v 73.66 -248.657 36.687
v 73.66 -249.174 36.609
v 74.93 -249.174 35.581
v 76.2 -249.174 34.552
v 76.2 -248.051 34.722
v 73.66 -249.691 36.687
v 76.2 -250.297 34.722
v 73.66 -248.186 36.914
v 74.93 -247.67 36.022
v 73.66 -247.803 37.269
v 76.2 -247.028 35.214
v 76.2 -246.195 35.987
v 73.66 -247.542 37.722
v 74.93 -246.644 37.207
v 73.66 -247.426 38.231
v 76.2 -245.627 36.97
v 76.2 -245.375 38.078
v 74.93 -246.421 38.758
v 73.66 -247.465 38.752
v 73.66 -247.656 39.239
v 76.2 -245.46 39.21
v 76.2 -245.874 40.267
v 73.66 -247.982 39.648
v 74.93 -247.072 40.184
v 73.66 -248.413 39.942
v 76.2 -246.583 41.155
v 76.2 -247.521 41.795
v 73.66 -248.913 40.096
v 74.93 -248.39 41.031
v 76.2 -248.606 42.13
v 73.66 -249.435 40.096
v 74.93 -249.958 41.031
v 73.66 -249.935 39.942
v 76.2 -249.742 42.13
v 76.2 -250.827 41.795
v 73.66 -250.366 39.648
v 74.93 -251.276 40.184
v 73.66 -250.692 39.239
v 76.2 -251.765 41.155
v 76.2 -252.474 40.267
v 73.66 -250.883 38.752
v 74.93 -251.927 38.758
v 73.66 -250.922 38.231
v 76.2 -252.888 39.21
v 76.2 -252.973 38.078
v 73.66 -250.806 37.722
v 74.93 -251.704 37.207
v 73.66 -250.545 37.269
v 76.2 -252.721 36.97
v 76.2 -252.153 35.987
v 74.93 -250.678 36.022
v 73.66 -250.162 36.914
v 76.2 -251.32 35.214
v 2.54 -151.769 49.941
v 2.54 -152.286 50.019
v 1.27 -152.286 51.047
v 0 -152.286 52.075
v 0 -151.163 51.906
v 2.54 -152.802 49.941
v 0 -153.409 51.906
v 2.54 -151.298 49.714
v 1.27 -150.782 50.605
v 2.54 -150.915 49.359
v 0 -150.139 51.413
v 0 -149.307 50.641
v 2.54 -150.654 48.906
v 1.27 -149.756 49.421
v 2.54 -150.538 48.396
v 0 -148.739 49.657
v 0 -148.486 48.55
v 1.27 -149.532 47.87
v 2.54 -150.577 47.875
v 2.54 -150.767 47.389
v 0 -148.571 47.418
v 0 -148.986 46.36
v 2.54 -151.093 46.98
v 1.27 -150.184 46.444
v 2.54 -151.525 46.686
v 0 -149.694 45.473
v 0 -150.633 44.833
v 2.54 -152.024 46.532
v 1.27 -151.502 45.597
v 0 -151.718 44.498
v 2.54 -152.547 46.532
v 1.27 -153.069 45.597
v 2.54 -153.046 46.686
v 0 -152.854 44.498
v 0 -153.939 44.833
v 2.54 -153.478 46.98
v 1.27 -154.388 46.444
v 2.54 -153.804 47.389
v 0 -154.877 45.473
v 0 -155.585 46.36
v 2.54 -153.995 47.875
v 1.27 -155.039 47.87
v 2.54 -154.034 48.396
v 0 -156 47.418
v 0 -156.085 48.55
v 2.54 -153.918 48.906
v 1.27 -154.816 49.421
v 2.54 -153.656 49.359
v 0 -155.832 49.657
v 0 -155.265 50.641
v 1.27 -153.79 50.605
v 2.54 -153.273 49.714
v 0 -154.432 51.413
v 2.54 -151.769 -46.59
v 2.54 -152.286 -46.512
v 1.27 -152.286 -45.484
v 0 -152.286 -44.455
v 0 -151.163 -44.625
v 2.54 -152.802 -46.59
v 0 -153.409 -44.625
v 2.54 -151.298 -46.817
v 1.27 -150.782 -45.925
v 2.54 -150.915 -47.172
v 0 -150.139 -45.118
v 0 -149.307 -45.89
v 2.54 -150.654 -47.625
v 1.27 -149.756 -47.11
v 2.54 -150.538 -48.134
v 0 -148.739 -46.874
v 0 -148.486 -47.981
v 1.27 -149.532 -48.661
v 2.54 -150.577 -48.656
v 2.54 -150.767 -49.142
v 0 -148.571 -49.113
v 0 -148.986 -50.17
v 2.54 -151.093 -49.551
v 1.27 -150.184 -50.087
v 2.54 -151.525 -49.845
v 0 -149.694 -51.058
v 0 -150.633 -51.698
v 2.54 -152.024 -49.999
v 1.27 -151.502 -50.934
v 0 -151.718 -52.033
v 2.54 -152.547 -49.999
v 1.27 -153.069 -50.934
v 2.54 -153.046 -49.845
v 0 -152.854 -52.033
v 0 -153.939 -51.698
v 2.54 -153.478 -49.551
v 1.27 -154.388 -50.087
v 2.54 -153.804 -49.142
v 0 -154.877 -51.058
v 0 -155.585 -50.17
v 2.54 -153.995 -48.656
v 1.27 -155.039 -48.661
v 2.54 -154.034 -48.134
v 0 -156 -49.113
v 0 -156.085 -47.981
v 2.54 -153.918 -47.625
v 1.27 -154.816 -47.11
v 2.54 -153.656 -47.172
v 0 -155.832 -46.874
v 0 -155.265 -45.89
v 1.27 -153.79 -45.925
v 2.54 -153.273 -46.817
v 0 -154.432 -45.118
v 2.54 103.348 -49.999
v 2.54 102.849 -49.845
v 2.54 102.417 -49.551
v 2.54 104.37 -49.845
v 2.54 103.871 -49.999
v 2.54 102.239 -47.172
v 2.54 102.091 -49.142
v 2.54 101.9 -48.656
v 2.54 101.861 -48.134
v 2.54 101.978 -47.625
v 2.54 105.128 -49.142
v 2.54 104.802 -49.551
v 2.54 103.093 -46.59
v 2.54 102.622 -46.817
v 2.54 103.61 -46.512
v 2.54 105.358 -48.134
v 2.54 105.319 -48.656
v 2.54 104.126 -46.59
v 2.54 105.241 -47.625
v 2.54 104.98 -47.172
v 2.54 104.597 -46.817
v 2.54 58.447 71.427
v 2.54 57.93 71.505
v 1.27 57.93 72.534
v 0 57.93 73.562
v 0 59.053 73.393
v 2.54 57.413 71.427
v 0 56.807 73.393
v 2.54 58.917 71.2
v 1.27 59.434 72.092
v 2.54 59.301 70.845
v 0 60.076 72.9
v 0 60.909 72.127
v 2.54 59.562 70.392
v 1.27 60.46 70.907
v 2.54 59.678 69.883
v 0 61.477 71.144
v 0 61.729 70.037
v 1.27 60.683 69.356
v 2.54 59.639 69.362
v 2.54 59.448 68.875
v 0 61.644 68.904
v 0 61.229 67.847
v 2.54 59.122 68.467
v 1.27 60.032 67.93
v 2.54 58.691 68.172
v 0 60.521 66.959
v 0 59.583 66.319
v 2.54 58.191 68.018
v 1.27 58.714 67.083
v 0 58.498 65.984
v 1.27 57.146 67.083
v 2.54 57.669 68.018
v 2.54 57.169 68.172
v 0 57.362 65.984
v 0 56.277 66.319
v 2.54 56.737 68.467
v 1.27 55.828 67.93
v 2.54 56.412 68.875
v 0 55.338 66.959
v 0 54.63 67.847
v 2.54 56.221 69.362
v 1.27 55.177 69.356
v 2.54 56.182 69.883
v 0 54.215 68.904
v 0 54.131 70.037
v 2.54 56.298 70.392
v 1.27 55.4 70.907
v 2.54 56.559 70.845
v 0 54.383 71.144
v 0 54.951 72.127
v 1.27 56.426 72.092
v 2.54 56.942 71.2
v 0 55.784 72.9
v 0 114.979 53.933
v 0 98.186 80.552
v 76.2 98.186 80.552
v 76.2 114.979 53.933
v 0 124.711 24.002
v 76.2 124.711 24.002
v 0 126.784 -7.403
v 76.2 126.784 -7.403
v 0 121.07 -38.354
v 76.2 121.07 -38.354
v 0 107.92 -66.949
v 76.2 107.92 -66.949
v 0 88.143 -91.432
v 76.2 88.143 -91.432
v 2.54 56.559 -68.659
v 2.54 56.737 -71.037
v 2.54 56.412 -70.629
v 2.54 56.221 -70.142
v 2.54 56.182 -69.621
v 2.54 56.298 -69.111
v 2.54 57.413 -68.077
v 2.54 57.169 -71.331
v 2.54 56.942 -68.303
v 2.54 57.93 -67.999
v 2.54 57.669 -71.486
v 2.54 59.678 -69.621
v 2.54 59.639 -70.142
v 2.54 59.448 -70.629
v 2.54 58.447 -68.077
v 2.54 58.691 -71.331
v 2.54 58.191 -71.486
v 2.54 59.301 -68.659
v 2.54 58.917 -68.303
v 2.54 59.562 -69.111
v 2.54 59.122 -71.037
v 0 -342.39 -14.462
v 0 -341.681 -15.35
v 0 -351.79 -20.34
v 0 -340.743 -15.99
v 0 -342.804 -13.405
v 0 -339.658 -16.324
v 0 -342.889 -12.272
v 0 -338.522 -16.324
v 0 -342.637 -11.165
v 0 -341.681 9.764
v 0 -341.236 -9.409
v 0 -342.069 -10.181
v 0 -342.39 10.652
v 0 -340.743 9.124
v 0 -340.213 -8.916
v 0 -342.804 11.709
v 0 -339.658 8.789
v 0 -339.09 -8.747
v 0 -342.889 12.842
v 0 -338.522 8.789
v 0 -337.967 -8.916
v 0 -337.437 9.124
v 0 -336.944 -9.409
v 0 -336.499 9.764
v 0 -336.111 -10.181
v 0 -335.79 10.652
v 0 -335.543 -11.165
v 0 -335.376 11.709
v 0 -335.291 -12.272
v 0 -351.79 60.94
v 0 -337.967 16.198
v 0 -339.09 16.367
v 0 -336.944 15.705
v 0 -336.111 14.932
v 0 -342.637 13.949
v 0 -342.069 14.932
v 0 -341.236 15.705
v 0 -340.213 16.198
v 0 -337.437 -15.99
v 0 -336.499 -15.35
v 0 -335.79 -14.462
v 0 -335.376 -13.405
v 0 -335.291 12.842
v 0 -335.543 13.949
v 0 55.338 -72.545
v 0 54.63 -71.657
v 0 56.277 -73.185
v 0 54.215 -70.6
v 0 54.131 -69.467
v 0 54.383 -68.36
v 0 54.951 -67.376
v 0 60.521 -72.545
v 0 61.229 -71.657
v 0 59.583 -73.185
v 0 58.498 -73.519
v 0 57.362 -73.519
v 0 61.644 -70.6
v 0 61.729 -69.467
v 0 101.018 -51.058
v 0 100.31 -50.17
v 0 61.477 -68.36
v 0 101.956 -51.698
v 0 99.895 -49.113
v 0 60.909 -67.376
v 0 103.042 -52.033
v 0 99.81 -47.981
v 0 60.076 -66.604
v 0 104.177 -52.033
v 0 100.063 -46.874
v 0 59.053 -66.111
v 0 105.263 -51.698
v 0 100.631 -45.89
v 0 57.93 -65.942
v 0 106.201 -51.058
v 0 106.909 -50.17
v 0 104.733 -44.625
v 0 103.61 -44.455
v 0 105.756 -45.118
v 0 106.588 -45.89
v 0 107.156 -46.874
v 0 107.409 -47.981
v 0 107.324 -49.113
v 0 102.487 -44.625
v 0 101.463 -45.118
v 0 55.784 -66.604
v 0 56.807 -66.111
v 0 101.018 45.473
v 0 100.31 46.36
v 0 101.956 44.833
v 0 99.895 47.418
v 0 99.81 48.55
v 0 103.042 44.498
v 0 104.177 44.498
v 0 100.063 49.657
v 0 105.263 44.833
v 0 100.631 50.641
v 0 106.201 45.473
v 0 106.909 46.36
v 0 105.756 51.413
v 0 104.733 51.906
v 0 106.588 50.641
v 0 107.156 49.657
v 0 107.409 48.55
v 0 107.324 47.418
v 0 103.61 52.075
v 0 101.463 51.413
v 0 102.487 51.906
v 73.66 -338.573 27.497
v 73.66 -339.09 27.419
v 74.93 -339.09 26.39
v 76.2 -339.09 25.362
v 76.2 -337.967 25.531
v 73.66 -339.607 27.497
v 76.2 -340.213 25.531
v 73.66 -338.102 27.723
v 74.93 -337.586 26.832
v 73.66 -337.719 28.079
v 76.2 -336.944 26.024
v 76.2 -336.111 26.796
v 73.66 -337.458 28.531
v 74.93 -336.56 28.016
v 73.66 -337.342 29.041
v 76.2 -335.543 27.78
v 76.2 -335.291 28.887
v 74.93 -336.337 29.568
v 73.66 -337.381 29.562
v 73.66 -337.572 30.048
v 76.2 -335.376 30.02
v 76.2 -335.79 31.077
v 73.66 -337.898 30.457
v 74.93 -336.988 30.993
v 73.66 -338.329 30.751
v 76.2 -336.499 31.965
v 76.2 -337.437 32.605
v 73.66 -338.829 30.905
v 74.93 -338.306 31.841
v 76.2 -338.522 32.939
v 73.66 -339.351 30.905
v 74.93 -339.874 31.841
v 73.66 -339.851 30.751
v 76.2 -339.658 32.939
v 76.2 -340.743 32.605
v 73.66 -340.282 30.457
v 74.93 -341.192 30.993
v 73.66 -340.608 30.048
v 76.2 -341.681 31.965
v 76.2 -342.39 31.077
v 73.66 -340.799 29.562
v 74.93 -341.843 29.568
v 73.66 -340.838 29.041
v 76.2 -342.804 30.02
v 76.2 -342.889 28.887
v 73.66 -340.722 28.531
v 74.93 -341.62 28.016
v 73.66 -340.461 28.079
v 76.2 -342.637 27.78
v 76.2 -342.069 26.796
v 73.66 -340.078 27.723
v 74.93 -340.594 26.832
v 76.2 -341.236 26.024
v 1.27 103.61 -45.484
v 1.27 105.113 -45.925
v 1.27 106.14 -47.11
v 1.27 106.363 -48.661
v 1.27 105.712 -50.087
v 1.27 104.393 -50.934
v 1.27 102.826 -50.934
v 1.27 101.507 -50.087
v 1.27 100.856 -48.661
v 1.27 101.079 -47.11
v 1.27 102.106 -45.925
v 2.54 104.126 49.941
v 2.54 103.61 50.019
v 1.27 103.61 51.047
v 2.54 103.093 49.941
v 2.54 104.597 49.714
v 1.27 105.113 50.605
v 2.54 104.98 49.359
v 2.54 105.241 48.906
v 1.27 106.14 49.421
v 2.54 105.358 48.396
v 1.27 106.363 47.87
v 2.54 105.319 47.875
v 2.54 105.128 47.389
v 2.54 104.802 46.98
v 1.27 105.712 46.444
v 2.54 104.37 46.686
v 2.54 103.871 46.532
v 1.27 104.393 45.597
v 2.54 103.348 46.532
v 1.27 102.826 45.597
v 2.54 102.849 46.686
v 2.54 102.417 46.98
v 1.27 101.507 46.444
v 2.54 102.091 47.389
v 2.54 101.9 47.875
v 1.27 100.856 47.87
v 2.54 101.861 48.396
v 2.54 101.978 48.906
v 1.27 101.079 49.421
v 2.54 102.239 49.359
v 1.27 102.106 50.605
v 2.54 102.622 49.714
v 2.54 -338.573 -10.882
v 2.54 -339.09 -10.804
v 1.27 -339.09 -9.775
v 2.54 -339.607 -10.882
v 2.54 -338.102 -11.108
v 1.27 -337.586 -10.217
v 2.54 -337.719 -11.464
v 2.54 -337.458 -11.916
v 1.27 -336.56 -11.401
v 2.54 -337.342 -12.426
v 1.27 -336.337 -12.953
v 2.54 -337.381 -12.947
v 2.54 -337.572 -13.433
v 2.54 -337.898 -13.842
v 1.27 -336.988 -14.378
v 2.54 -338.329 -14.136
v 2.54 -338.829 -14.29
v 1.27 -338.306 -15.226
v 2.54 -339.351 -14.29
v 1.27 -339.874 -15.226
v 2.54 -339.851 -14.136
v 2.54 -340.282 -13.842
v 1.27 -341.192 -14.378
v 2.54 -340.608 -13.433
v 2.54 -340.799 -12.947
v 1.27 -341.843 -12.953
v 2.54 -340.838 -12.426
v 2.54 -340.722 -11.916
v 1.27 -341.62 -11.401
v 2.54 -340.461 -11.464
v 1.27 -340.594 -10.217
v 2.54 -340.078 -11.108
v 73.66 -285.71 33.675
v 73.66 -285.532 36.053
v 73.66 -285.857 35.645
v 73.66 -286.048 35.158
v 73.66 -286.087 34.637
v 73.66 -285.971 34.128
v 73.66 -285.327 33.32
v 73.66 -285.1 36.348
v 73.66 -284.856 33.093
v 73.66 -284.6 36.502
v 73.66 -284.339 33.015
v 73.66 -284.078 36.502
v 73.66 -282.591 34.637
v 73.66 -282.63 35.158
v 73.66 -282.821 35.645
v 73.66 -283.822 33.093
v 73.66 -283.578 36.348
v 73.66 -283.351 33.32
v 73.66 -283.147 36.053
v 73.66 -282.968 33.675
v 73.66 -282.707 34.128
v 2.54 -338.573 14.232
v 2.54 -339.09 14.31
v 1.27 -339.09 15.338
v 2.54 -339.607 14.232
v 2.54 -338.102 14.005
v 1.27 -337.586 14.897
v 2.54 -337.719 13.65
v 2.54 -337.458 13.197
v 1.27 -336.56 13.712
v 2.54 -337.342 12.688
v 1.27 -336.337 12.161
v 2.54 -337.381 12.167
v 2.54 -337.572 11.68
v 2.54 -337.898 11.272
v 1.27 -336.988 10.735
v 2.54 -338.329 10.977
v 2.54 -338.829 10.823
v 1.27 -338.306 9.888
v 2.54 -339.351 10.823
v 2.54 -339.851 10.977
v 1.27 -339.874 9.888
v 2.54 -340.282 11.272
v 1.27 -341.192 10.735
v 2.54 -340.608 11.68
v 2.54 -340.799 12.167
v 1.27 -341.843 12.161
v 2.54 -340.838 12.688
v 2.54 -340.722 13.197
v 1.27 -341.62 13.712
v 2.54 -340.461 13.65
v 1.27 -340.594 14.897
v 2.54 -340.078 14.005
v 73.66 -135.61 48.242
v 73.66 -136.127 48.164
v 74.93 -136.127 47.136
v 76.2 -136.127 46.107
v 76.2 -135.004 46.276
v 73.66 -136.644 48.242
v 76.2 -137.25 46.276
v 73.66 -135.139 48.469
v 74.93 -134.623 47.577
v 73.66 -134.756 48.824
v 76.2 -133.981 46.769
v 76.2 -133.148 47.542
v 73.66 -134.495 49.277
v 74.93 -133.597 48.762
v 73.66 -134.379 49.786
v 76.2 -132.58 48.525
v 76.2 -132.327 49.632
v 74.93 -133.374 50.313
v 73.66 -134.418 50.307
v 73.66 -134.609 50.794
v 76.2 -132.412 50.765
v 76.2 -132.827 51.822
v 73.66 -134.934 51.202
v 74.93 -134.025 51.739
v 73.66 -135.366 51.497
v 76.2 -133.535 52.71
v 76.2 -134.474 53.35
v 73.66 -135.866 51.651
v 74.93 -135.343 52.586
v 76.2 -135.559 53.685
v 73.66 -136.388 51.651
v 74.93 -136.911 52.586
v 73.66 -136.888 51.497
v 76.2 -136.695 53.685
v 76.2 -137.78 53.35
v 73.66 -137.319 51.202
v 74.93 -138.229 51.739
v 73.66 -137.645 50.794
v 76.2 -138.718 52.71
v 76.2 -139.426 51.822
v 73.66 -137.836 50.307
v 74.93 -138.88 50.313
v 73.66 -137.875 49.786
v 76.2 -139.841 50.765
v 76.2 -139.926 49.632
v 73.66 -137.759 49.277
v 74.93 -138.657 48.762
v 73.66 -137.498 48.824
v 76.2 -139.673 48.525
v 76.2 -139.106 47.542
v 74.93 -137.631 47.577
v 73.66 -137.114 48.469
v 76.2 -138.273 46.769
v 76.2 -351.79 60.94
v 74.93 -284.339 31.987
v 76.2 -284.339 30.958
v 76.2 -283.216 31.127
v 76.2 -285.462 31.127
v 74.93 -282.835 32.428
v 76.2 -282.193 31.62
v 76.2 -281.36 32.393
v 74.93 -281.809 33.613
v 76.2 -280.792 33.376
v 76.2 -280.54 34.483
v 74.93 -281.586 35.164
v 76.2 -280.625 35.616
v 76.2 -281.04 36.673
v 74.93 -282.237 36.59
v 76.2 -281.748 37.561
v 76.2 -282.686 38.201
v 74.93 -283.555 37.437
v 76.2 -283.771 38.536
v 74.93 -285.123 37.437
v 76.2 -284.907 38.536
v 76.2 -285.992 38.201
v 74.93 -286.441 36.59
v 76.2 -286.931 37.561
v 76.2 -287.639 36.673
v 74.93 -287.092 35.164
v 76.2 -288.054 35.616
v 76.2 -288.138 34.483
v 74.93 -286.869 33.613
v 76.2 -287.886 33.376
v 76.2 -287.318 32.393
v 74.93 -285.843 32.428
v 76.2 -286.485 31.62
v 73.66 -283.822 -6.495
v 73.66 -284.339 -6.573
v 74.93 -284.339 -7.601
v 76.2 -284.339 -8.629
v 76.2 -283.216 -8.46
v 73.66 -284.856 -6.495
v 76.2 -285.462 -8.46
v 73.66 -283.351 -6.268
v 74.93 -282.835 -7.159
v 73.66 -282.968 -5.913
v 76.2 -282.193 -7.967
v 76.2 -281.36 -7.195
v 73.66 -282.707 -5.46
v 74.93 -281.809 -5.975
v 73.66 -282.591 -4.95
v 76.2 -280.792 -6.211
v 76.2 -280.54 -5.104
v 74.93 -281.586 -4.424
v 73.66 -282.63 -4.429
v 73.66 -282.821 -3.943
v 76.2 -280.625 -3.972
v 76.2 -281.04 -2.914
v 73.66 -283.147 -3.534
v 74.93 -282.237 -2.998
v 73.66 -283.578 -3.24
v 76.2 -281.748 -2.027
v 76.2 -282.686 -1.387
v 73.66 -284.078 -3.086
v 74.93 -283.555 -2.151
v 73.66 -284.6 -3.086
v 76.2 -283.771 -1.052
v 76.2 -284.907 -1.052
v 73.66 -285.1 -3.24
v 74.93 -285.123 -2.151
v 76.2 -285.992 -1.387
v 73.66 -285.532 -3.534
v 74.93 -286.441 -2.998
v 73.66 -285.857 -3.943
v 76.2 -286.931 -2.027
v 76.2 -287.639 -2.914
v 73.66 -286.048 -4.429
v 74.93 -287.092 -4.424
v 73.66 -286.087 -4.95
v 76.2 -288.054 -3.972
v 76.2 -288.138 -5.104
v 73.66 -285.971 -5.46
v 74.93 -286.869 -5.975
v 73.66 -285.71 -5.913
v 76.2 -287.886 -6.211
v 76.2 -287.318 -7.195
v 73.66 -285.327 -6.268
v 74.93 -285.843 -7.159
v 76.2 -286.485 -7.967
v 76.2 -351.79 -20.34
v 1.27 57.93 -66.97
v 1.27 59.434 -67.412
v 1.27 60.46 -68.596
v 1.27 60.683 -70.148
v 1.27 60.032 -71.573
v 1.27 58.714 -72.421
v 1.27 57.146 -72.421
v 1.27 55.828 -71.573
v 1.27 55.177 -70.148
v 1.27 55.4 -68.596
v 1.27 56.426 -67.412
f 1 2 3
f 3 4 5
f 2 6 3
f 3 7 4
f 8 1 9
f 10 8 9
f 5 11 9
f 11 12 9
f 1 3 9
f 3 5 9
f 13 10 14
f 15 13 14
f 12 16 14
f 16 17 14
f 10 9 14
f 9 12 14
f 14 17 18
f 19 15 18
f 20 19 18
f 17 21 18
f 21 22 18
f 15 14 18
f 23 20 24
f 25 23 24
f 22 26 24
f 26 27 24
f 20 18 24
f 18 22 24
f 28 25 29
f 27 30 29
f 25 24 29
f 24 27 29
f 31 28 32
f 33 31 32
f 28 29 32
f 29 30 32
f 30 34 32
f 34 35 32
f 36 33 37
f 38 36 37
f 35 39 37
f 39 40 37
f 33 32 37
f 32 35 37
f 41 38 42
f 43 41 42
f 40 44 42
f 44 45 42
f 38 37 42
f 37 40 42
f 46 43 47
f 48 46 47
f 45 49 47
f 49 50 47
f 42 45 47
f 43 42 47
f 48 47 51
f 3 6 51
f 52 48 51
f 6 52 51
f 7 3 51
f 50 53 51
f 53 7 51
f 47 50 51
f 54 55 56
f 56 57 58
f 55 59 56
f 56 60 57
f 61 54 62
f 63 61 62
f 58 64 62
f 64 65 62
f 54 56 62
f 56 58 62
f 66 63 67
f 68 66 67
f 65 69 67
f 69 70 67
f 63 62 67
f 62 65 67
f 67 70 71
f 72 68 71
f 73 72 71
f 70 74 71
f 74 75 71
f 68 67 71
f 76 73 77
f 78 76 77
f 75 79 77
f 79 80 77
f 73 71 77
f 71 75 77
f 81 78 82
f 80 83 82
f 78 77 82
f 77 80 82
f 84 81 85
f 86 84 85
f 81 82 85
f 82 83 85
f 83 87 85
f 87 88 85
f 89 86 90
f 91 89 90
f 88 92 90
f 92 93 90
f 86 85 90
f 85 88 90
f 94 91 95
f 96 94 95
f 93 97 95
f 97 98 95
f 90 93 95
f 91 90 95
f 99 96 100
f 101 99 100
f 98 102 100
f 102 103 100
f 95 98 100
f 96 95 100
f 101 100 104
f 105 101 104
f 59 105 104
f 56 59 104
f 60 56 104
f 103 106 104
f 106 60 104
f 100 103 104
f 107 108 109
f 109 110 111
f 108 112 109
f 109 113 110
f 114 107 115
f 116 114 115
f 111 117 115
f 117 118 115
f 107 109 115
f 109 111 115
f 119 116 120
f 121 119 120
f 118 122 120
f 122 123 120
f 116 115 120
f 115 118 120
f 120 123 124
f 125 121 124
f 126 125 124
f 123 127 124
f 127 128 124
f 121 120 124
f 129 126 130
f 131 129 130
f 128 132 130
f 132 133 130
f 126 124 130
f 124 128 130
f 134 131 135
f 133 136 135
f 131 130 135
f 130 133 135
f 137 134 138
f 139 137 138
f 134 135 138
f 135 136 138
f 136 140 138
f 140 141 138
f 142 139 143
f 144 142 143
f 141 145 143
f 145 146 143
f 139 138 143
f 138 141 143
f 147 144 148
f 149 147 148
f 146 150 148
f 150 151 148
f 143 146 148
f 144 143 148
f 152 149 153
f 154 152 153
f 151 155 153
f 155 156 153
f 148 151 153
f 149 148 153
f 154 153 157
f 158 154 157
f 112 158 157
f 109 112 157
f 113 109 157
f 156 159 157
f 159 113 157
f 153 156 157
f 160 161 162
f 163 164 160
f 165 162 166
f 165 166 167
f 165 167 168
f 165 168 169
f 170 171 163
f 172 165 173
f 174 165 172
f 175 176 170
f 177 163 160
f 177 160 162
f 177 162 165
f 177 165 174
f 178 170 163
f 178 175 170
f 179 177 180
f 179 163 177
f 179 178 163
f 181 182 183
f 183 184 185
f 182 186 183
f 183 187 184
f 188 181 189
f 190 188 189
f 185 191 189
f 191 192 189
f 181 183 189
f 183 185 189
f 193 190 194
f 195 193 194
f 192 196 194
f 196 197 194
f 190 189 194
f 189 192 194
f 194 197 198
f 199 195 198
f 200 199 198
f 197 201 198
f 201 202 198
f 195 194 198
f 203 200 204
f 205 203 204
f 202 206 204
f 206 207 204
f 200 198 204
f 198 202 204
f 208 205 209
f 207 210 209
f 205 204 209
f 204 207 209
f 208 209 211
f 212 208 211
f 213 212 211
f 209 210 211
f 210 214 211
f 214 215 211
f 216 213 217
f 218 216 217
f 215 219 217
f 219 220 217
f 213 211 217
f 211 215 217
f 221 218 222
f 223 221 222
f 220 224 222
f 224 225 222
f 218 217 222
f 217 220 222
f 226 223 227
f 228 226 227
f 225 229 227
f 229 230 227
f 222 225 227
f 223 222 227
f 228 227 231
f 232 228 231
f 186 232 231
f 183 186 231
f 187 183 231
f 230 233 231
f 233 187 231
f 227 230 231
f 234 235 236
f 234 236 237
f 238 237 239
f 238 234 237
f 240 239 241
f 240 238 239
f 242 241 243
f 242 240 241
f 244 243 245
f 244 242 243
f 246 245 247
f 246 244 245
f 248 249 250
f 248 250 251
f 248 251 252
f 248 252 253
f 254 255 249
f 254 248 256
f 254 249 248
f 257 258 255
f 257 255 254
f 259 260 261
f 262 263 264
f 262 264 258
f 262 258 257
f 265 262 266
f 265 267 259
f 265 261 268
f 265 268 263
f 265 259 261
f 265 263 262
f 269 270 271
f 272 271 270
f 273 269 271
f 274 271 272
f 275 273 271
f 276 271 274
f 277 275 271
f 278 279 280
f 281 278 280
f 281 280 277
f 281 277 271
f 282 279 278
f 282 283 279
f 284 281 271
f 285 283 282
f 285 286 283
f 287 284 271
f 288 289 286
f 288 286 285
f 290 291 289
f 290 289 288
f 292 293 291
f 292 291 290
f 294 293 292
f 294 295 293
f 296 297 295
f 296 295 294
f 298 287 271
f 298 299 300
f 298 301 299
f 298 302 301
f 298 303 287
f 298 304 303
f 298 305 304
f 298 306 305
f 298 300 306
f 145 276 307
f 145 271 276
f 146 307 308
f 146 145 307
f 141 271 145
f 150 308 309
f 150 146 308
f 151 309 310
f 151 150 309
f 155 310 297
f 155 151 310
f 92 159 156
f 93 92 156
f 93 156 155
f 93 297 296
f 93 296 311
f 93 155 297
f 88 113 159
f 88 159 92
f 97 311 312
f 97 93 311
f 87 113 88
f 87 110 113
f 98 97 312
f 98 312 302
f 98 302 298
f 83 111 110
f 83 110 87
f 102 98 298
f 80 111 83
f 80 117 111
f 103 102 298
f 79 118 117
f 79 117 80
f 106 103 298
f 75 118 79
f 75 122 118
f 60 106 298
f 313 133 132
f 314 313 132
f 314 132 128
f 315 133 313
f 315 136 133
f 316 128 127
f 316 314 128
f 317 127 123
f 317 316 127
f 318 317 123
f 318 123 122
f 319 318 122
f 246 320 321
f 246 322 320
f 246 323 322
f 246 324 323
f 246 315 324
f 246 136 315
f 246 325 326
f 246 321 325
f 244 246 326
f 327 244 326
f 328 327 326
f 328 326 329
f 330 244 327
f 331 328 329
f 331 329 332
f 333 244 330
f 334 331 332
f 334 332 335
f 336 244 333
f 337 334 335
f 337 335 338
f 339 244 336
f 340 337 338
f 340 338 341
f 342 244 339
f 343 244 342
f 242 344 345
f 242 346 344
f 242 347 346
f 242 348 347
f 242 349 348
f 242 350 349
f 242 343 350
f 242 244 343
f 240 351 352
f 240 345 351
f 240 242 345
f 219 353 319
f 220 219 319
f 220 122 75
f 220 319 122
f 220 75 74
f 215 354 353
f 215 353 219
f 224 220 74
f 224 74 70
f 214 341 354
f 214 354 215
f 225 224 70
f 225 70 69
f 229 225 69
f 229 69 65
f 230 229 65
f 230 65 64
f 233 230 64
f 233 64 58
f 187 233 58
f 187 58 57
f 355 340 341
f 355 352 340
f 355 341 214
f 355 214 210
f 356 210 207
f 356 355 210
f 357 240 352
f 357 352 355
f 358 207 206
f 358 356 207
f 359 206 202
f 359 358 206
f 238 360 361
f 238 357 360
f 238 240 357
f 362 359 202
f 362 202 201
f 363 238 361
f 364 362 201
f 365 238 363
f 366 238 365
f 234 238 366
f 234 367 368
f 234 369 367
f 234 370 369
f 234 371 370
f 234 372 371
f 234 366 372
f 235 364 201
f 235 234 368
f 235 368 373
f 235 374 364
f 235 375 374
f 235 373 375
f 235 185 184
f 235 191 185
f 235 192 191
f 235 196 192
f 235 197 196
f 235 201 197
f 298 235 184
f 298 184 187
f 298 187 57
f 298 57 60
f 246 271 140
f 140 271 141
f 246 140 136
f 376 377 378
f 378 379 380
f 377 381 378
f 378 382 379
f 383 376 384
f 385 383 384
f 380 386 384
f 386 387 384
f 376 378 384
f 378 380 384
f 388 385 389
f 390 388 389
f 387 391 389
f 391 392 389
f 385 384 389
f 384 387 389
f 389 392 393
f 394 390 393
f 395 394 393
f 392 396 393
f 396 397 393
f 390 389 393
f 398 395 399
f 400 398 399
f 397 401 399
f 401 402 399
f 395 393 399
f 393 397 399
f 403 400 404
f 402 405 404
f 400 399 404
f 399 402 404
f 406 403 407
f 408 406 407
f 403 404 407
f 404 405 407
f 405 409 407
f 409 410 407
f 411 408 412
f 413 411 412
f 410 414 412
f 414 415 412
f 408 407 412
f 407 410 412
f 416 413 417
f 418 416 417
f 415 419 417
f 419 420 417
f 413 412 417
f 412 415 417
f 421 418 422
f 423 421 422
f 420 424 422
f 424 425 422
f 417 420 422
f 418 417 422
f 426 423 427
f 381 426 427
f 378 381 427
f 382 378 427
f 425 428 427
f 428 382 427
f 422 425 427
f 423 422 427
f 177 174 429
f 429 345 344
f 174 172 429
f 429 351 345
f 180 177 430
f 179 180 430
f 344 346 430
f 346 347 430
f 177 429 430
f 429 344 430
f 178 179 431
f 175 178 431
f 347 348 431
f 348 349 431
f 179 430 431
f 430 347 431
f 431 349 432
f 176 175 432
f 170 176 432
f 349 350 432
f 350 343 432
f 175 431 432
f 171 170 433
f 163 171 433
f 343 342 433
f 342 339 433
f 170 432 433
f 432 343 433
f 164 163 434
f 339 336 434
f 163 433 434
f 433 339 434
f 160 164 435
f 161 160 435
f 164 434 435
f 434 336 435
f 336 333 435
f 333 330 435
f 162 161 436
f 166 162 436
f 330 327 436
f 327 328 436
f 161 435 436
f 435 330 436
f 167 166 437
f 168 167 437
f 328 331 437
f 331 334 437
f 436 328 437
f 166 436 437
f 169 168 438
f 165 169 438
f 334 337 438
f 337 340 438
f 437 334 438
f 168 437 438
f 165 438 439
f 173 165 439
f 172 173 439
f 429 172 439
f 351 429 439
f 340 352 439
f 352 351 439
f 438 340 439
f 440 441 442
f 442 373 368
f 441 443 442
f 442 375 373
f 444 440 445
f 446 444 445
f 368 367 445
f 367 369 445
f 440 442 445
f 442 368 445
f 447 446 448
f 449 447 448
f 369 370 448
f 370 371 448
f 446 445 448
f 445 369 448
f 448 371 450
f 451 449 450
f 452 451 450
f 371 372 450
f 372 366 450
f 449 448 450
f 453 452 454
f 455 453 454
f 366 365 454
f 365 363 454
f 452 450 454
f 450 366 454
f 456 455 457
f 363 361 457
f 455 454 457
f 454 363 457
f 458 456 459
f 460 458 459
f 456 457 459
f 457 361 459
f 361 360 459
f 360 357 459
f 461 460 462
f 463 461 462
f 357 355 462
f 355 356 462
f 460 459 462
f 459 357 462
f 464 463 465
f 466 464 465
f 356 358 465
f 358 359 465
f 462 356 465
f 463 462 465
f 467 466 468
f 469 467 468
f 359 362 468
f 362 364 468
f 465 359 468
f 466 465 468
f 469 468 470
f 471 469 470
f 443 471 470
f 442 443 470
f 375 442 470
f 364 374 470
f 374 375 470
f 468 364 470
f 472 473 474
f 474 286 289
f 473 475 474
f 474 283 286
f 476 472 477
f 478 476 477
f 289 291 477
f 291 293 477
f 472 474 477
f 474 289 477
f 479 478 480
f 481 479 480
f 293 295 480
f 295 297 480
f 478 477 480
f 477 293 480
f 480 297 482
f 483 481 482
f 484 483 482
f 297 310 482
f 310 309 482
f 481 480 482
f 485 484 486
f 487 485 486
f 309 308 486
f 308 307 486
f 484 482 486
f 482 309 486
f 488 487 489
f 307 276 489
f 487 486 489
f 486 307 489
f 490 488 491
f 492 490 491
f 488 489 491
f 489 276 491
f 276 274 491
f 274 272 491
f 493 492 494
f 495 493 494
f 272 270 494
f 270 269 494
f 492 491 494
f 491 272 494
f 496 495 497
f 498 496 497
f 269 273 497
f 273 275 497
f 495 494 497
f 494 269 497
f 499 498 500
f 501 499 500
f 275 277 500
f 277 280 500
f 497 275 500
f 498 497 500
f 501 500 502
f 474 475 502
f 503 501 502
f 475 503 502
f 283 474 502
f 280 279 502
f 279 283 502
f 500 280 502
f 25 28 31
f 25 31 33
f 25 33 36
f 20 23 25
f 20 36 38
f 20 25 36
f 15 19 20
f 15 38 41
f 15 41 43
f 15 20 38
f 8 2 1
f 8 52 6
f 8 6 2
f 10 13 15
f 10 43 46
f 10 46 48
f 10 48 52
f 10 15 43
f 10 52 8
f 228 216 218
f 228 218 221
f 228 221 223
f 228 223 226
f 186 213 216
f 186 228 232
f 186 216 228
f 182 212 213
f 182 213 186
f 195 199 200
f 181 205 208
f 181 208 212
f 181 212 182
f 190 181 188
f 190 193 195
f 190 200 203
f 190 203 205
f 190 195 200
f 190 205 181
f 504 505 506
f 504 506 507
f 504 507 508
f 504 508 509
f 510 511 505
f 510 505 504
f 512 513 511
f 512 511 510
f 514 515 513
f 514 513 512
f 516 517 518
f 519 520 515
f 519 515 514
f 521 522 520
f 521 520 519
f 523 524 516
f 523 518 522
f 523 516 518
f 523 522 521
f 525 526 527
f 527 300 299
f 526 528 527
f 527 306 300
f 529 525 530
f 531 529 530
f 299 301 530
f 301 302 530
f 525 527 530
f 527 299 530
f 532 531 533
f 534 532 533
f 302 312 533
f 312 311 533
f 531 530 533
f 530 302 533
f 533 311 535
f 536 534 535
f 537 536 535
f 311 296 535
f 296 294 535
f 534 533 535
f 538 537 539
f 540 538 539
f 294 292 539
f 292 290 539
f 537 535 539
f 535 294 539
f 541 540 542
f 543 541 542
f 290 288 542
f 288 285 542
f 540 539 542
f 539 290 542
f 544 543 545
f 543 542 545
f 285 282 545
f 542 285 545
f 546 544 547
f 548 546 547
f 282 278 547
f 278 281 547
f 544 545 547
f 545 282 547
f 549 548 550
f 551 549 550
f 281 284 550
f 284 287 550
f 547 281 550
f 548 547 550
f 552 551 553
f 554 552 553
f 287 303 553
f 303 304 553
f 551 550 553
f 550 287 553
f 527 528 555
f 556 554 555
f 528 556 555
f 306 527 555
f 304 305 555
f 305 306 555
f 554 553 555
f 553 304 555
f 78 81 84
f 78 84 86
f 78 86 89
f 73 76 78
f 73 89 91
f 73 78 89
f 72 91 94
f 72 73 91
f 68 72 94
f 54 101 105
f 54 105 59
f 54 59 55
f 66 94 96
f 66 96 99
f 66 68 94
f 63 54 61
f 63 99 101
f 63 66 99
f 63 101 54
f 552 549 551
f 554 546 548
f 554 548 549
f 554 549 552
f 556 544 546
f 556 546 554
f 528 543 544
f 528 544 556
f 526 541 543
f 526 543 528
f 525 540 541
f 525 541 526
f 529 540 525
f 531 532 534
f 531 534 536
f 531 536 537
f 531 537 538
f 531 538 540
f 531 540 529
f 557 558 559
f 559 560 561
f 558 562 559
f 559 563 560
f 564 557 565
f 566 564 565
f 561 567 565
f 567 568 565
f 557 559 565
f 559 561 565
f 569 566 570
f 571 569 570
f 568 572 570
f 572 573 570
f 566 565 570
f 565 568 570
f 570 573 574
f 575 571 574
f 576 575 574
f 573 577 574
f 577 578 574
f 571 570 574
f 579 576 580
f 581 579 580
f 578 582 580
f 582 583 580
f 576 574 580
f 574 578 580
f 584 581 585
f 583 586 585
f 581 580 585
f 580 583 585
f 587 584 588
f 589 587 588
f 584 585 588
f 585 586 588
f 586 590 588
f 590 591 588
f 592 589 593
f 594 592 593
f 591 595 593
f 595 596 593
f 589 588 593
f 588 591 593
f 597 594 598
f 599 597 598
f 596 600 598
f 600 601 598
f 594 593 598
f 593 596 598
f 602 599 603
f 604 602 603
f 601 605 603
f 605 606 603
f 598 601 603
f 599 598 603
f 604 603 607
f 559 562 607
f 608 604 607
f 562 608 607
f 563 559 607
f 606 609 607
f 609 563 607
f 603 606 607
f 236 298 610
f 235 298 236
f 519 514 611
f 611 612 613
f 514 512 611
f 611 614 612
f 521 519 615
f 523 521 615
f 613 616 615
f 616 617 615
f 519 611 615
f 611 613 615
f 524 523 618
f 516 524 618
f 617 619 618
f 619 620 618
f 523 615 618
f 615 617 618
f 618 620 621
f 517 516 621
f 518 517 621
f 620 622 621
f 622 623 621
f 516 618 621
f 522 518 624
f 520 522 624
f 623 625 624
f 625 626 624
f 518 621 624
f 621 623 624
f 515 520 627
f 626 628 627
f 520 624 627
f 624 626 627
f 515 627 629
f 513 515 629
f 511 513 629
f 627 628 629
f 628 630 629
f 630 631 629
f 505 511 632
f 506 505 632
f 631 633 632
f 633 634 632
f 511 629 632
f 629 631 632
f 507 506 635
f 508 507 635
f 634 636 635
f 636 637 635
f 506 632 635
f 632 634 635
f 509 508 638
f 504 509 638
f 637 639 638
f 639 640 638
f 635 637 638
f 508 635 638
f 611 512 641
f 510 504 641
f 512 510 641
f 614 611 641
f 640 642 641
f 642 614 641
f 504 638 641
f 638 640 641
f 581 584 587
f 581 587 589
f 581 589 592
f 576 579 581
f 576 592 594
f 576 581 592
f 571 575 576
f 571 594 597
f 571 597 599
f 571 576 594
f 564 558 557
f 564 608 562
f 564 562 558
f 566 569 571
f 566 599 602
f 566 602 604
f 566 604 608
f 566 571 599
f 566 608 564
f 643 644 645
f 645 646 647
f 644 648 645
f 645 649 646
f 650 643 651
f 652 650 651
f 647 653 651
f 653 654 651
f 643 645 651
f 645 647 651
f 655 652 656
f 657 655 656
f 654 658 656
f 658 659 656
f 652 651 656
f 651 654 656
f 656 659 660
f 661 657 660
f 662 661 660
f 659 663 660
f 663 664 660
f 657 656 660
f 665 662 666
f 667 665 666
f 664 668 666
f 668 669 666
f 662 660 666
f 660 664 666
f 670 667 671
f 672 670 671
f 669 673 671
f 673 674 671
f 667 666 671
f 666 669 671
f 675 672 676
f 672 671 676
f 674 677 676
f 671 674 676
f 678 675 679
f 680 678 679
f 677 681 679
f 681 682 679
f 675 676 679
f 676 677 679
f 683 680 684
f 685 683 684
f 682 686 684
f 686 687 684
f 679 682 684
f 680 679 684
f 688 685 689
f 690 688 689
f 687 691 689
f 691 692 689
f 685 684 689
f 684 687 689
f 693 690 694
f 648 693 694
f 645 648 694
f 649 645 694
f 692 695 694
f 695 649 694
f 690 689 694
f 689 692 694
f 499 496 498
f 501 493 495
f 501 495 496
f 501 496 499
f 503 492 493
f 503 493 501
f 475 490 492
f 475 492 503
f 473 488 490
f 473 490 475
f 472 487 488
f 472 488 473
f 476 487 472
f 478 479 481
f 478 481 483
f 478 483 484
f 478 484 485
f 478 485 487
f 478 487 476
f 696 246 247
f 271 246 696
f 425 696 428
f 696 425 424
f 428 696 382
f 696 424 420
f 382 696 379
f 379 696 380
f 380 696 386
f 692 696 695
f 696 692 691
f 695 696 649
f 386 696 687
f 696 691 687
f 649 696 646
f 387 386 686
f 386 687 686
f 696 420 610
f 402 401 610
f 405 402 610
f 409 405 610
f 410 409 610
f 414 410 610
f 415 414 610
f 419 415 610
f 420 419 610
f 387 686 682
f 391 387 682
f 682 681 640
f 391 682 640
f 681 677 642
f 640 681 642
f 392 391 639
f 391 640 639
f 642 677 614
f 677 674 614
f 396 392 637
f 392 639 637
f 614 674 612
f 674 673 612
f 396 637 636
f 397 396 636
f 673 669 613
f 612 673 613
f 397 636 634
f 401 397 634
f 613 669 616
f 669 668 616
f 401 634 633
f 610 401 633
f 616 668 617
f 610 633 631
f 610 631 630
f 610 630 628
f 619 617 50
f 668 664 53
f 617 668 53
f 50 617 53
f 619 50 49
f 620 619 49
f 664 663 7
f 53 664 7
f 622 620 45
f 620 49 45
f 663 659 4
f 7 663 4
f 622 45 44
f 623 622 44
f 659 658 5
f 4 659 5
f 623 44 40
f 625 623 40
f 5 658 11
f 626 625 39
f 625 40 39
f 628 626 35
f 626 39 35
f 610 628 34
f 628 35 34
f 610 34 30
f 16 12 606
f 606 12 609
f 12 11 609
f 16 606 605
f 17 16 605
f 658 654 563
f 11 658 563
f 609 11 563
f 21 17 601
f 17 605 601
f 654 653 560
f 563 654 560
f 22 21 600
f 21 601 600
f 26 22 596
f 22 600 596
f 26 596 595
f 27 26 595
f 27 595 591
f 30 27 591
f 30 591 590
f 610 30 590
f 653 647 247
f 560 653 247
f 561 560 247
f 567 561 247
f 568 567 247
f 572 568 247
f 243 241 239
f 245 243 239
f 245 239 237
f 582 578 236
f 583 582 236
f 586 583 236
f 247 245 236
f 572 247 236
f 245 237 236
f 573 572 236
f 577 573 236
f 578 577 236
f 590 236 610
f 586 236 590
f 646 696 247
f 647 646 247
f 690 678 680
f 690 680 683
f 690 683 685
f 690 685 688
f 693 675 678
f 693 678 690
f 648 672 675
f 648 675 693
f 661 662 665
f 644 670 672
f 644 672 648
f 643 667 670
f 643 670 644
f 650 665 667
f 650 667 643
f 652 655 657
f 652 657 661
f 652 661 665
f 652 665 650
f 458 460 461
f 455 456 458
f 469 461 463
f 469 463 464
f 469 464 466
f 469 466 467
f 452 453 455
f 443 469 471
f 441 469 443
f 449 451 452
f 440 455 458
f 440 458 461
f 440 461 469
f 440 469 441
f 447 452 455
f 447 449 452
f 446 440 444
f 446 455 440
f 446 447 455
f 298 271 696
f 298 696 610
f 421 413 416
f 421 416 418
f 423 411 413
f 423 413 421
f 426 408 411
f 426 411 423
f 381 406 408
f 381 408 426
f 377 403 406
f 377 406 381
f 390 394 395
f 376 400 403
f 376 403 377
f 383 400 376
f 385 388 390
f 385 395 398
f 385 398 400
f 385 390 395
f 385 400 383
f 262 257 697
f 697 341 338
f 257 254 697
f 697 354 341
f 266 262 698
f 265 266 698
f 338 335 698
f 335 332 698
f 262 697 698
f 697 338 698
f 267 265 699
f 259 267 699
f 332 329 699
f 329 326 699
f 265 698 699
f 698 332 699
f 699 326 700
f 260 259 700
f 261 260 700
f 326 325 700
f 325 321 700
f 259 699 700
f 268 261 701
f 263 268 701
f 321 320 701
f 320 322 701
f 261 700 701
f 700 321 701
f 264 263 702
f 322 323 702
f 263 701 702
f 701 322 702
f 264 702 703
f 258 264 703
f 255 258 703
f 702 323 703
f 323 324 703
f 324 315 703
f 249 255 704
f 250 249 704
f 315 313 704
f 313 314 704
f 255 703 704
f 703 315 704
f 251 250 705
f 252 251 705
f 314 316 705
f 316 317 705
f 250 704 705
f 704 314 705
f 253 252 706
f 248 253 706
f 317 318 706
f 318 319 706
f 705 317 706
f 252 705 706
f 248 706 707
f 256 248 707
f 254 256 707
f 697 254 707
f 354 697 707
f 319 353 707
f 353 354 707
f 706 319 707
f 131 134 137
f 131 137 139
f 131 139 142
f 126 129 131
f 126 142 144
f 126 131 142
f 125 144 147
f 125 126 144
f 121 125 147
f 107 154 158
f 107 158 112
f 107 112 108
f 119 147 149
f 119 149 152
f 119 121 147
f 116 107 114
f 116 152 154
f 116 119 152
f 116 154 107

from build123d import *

# Parameters (mm, degrees)
SALIENTE_EXTRUIR1_DEPTH         = 76.2
CROQUIS4_R                      = 3.81
CORTAR_EXTRUIR1_DEPTH           = 2.54
CORTAR_EXTRUIR1_DRAFT           = -39
CORTAR_EXTRUIR1_PROFILE_2_DEPTH = 2.54
CORTAR_EXTRUIR1_PROFILE_2_DRAFT = -39
CORTAR_EXTRUIR1_PROFILE_3_DEPTH = 2.54
CORTAR_EXTRUIR1_PROFILE_3_DRAFT = -39
CORTAR_EXTRUIR1_PROFILE_4_DEPTH = 2.54
CORTAR_EXTRUIR1_PROFILE_4_DRAFT = -39
CORTAR_EXTRUIR1_PROFILE_5_DEPTH = 2.54
CORTAR_EXTRUIR1_PROFILE_5_DRAFT = -39
CORTAR_EXTRUIR1_PROFILE_6_DEPTH = 2.54
CORTAR_EXTRUIR1_PROFILE_6_DRAFT = -39
CROQUIS5_R                      = 3.81
CORTAR_EXTRUIR2_DEPTH           = 2.54
CORTAR_EXTRUIR2_DRAFT           = -39
CORTAR_EXTRUIR2_PROFILE_2_DEPTH = 2.54
CORTAR_EXTRUIR2_PROFILE_2_DRAFT = -39
CORTAR_EXTRUIR2_PROFILE_3_DEPTH = 2.54
CORTAR_EXTRUIR2_PROFILE_3_DRAFT = -39
CORTAR_EXTRUIR2_PROFILE_4_DEPTH = 2.54
CORTAR_EXTRUIR2_PROFILE_4_DRAFT = -39
CORTAR_EXTRUIR2_PROFILE_5_DEPTH = 2.54
CORTAR_EXTRUIR2_PROFILE_5_DRAFT = -39
CORTAR_EXTRUIR2_PROFILE_6_DEPTH = 2.54
CORTAR_EXTRUIR2_PROFILE_6_DRAFT = -39
CORTAR_EXTRUIR2_PROFILE_7_DEPTH = 2.54
CORTAR_EXTRUIR2_PROFILE_7_DRAFT = -39
CORTAR_EXTRUIR2_PROFILE_8_DEPTH = 2.54
CORTAR_EXTRUIR2_PROFILE_8_DRAFT = -39
CORTAR_EXTRUIR2_PROFILE_9_DEPTH = 2.54
CORTAR_EXTRUIR2_PROFILE_9_DRAFT = -39


with BuildPart() as part:
    # Croquis1 → Saliente-Extruir1 (new body)
    with BuildSketch(Plane(origin=(0, 0, 0), x_dir=(0, 0, -1), z_dir=(1, 0, 0))):
        with BuildLine():
            Line((-60.94000004, -351.79000001), (-80.551642675, 98.185705998))
            ThreePointArc((-80.551642675, 98.185705998), (7.403499257, 126.784021859), (91.432215779, 88.142781427))
            Line((91.432215779, 88.142781427), (20.33999996, -351.79000001))
            Line((20.33999996, -351.79000001), (-60.94000004, -351.79000001))
        make_face()
    extrude(amount=SALIENTE_EXTRUIR1_DEPTH)


with BuildPart() as cortar_extruir1_tool:
    # Croquis4 → Cortar-Extruir1 (with draft: the straight prism first)
    with BuildSketch(Plane(origin=(76.2, 0, 0), x_dir=(0, 0, -1), z_dir=(1, 0, 0))):
        with Locations((-49.917099877, -136.126844727)):
            Circle(CROQUIS4_R)
    extrude(amount=-CORTAR_EXTRUIR1_DEPTH)
    # Cortar-Extruir1: the draft: its side faces are tilted about the plane it starts from
    cortar_extruir1_sides = [cortar_extruir1_tool.faces().sort_by_distance(p)[0] for p in [
        (74.93, -136.126844727, 53.727099877),
    ]]
    draft(cortar_extruir1_sides, Plane(origin=(76.2, 0, 0), x_dir=(0, 0, -1), z_dir=(1, 0, 0)), CORTAR_EXTRUIR1_DRAFT)


with BuildPart() as part_1:
    add(part.part)

    # Cortar-Extruir1: cut by cortar_extruir1_tool
    add(cortar_extruir1_tool.part, mode=Mode.SUBTRACT)


with BuildPart() as cortar_extruir1_profile_2_tool:
    # Croquis4 → Cortar-Extruir1 profile 2 (with draft: the straight prism first)
    with BuildSketch(Plane(origin=(76.2, 0, 0), x_dir=(0, 0, -1), z_dir=(1, 0, 0))):
        with Locations((-38.362373799, -249.174001321)):
            Circle(CROQUIS4_R)
    extrude(amount=-CORTAR_EXTRUIR1_PROFILE_2_DEPTH)
    # Cortar-Extruir1 profile 2: the draft: its side faces are tilted about the plane it starts from
    cortar_extruir1_profile_2_sides = [cortar_extruir1_profile_2_tool.faces().sort_by_distance(p)[0] for p in [
        (74.93, -249.174001321, 42.172373799),
    ]]
    draft(cortar_extruir1_profile_2_sides, Plane(origin=(76.2, 0, 0), x_dir=(0, 0, -1), z_dir=(1, 0, 0)), CORTAR_EXTRUIR1_PROFILE_2_DRAFT)


with BuildPart() as part_2:
    add(part_1.part)

    # Cortar-Extruir1 profile 2: cut by cortar_extruir1_profile_2_tool
    add(cortar_extruir1_profile_2_tool.part, mode=Mode.SUBTRACT)


with BuildPart() as cortar_extruir1_profile_3_tool:
    # Croquis4 → Cortar-Extruir1 profile 3 (with draft: the straight prism first)
    with BuildSketch(Plane(origin=(76.2, 0, 0), x_dir=(0, 0, -1), z_dir=(1, 0, 0))):
        with Locations((-34.768096531, -284.339077712)):
            Circle(CROQUIS4_R)
    extrude(amount=-CORTAR_EXTRUIR1_PROFILE_3_DEPTH)
    # Cortar-Extruir1 profile 3: the draft: its side faces are tilted about the plane it starts from
    cortar_extruir1_profile_3_sides = [cortar_extruir1_profile_3_tool.faces().sort_by_distance(p)[0] for p in [
        (74.93, -284.339077712, 38.578096531),
    ]]
    draft(cortar_extruir1_profile_3_sides, Plane(origin=(76.2, 0, 0), x_dir=(0, 0, -1), z_dir=(1, 0, 0)), CORTAR_EXTRUIR1_PROFILE_3_DRAFT)


with BuildPart() as part_3:
    add(part_2.part)

    # Cortar-Extruir1 profile 3: cut by cortar_extruir1_profile_3_tool
    add(cortar_extruir1_profile_3_tool.part, mode=Mode.SUBTRACT)


with BuildPart() as cortar_extruir1_profile_4_tool:
    # Croquis4 → Cortar-Extruir1 profile 4 (with draft: the straight prism first)
    with BuildSketch(Plane(origin=(76.2, 0, 0), x_dir=(0, 0, -1), z_dir=(1, 0, 0))):
        with Locations((-29.171919425, -339.09000001)):
            Circle(CROQUIS4_R)
    extrude(amount=-CORTAR_EXTRUIR1_PROFILE_4_DEPTH)
    # Cortar-Extruir1 profile 4: the draft: its side faces are tilted about the plane it starts from
    cortar_extruir1_profile_4_sides = [cortar_extruir1_profile_4_tool.faces().sort_by_distance(p)[0] for p in [
        (74.93, -339.09000001, 32.981919425),
    ]]
    draft(cortar_extruir1_profile_4_sides, Plane(origin=(76.2, 0, 0), x_dir=(0, 0, -1), z_dir=(1, 0, 0)), CORTAR_EXTRUIR1_PROFILE_4_DRAFT)


with BuildPart() as part_4:
    add(part_3.part)

    # Cortar-Extruir1 profile 4: cut by cortar_extruir1_profile_4_tool
    add(cortar_extruir1_profile_4_tool.part, mode=Mode.SUBTRACT)


with BuildPart() as cortar_extruir1_profile_5_tool:
    # Croquis4 → Cortar-Extruir1 profile 5 (with draft: the straight prism first)
    with BuildSketch(Plane(origin=(76.2, 0, 0), x_dir=(0, 0, -1), z_dir=(1, 0, 0))):
        with Locations((29.171919425, -339.09000001)):
            Circle(CROQUIS4_R)
    extrude(amount=-CORTAR_EXTRUIR1_PROFILE_5_DEPTH)
    # Cortar-Extruir1 profile 5: the draft: its side faces are tilted about the plane it starts from
    cortar_extruir1_profile_5_sides = [cortar_extruir1_profile_5_tool.faces().sort_by_distance(p)[0] for p in [
        (74.93, -339.09000001, -25.361919425),
    ]]
    draft(cortar_extruir1_profile_5_sides, Plane(origin=(76.2, 0, 0), x_dir=(0, 0, -1), z_dir=(1, 0, 0)), CORTAR_EXTRUIR1_PROFILE_5_DRAFT)


with BuildPart() as part_5:
    add(part_4.part)

    # Cortar-Extruir1 profile 5: cut by cortar_extruir1_profile_5_tool
    add(cortar_extruir1_profile_5_tool.part, mode=Mode.SUBTRACT)


with BuildPart() as cortar_extruir1_profile_6_tool:
    # Croquis4 → Cortar-Extruir1 profile 6 (with draft: the straight prism first)
    with BuildSketch(Plane(origin=(76.2, 0, 0), x_dir=(0, 0, -1), z_dir=(1, 0, 0))):
        with Locations((4.819460737, -284.339077712)):
            Circle(CROQUIS4_R)
    extrude(amount=-CORTAR_EXTRUIR1_PROFILE_6_DEPTH)
    # Cortar-Extruir1 profile 6: the draft: its side faces are tilted about the plane it starts from
    cortar_extruir1_profile_6_sides = [cortar_extruir1_profile_6_tool.faces().sort_by_distance(p)[0] for p in [
        (74.93, -284.339077712, -1.009460737),
    ]]
    draft(cortar_extruir1_profile_6_sides, Plane(origin=(76.2, 0, 0), x_dir=(0, 0, -1), z_dir=(1, 0, 0)), CORTAR_EXTRUIR1_PROFILE_6_DRAFT)


with BuildPart() as part_6:
    add(part_5.part)

    # Cortar-Extruir1 profile 6: cut by cortar_extruir1_profile_6_tool
    add(cortar_extruir1_profile_6_tool.part, mode=Mode.SUBTRACT)


with BuildPart() as cortar_extruir2_tool:
    # Croquis5 → Cortar-Extruir2 (with draft: the straight prism first)
    with BuildSketch(Plane.ZY):
        with Locations((-12.556850651, -339.09000001)):
            Circle(CROQUIS5_R)
    extrude(amount=-CORTAR_EXTRUIR2_DEPTH)
    # Cortar-Extruir2: the draft: its side faces are tilted about the plane it starts from
    cortar_extruir2_sides = [cortar_extruir2_tool.faces().sort_by_distance(p)[0] for p in [
        (1.27, -339.09000001, -16.366850651),
    ]]
    draft(cortar_extruir2_sides, Plane.ZY, CORTAR_EXTRUIR2_DRAFT)


with BuildPart() as part_7:
    add(part_6.part)

    # Cortar-Extruir2: cut by cortar_extruir2_tool
    add(cortar_extruir2_tool.part, mode=Mode.SUBTRACT)


with BuildPart() as cortar_extruir2_profile_2_tool:
    # Croquis5 → Cortar-Extruir2 profile 2 (with draft: the straight prism first)
    with BuildSketch(Plane.ZY):
        with Locations((12.556850651, -339.09000001)):
            Circle(CROQUIS5_R)
    extrude(amount=-CORTAR_EXTRUIR2_PROFILE_2_DEPTH)
    # Cortar-Extruir2 profile 2: the draft: its side faces are tilted about the plane it starts from
    cortar_extruir2_profile_2_sides = [cortar_extruir2_profile_2_tool.faces().sort_by_distance(p)[0] for p in [
        (1.27, -339.09000001, 8.746850651),
    ]]
    draft(cortar_extruir2_profile_2_sides, Plane.ZY, CORTAR_EXTRUIR2_PROFILE_2_DRAFT)


with BuildPart() as part_8:
    add(part_7.part)

    # Cortar-Extruir2 profile 2: cut by cortar_extruir2_profile_2_tool
    add(cortar_extruir2_profile_2_tool.part, mode=Mode.SUBTRACT)


with BuildPart() as cortar_extruir2_profile_3_tool:
    # Croquis5 → Cortar-Extruir2 profile 3 (with draft: the straight prism first)
    with BuildSketch(Plane.ZY):
        with Locations((-34.182100121, -290.072249352)):
            Circle(CROQUIS5_R)
    extrude(amount=-CORTAR_EXTRUIR2_PROFILE_3_DEPTH)
    # Cortar-Extruir2 profile 3: the draft: its side faces are tilted about the plane it starts from
    cortar_extruir2_profile_3_sides = [cortar_extruir2_profile_3_tool.faces().sort_by_distance(p)[0] for p in [
        (1.27, -290.072249352, -37.992100121),
    ]]
    draft(cortar_extruir2_profile_3_sides, Plane.ZY, CORTAR_EXTRUIR2_PROFILE_3_DRAFT)


with BuildPart() as part_9:
    add(part_8.part)

    # Cortar-Extruir2 profile 3: cut by cortar_extruir2_profile_3_tool
    add(cortar_extruir2_profile_3_tool.part, mode=Mode.SUBTRACT)


with BuildPart() as cortar_extruir2_profile_4_tool:
    # Croquis5 → Cortar-Extruir2 profile 4 (with draft: the straight prism first)
    with BuildSketch(Plane.ZY):
        with Locations((-48.265473167, -152.285748198)):
            Circle(CROQUIS5_R)
    extrude(amount=-CORTAR_EXTRUIR2_PROFILE_4_DEPTH)
    # Cortar-Extruir2 profile 4: the draft: its side faces are tilted about the plane it starts from
    cortar_extruir2_profile_4_sides = [cortar_extruir2_profile_4_tool.faces().sort_by_distance(p)[0] for p in [
        (1.27, -152.285748198, -52.075473167),
    ]]
    draft(cortar_extruir2_profile_4_sides, Plane.ZY, CORTAR_EXTRUIR2_PROFILE_4_DRAFT)


with BuildPart() as part_10:
    add(part_9.part)

    # Cortar-Extruir2 profile 4: cut by cortar_extruir2_profile_4_tool
    add(cortar_extruir2_profile_4_tool.part, mode=Mode.SUBTRACT)


with BuildPart() as cortar_extruir2_profile_5_tool:
    # Croquis5 → Cortar-Extruir2 profile 5 (with draft: the straight prism first)
    with BuildSketch(Plane.ZY):
        with Locations((-69.751939629, 57.929874619)):
            Circle(CROQUIS5_R)
    extrude(amount=-CORTAR_EXTRUIR2_PROFILE_5_DEPTH)
    # Cortar-Extruir2 profile 5: the draft: its side faces are tilted about the plane it starts from
    cortar_extruir2_profile_5_sides = [cortar_extruir2_profile_5_tool.faces().sort_by_distance(p)[0] for p in [
        (1.27, 57.929874619, -73.561939629),
    ]]
    draft(cortar_extruir2_profile_5_sides, Plane.ZY, CORTAR_EXTRUIR2_PROFILE_5_DRAFT)


with BuildPart() as part_11:
    add(part_10.part)

    # Cortar-Extruir2 profile 5: cut by cortar_extruir2_profile_5_tool
    add(cortar_extruir2_profile_5_tool.part, mode=Mode.SUBTRACT)


with BuildPart() as cortar_extruir2_profile_6_tool:
    # Croquis5 → Cortar-Extruir2 profile 6 (with draft: the straight prism first)
    with BuildSketch(Plane.ZY):
        with Locations((-48.265473167, 103.609527072)):
            Circle(CROQUIS5_R)
    extrude(amount=-CORTAR_EXTRUIR2_PROFILE_6_DEPTH)
    # Cortar-Extruir2 profile 6: the draft: its side faces are tilted about the plane it starts from
    cortar_extruir2_profile_6_sides = [cortar_extruir2_profile_6_tool.faces().sort_by_distance(p)[0] for p in [
        (1.27, 103.609527072, -52.075473167),
    ]]
    draft(cortar_extruir2_profile_6_sides, Plane.ZY, CORTAR_EXTRUIR2_PROFILE_6_DRAFT)


with BuildPart() as part_12:
    add(part_11.part)

    # Cortar-Extruir2 profile 6: cut by cortar_extruir2_profile_6_tool
    add(cortar_extruir2_profile_6_tool.part, mode=Mode.SUBTRACT)


with BuildPart() as cortar_extruir2_profile_7_tool:
    # Croquis5 → Cortar-Extruir2 profile 7 (with draft: the straight prism first)
    with BuildSketch(Plane.ZY):
        with Locations((48.265473167, 103.609527072)):
            Circle(CROQUIS5_R)
    extrude(amount=-CORTAR_EXTRUIR2_PROFILE_7_DEPTH)
    # Cortar-Extruir2 profile 7: the draft: its side faces are tilted about the plane it starts from
    cortar_extruir2_profile_7_sides = [cortar_extruir2_profile_7_tool.faces().sort_by_distance(p)[0] for p in [
        (1.27, 103.609527072, 44.455473167),
    ]]
    draft(cortar_extruir2_profile_7_sides, Plane.ZY, CORTAR_EXTRUIR2_PROFILE_7_DRAFT)


with BuildPart() as part_13:
    add(part_12.part)

    # Cortar-Extruir2 profile 7: cut by cortar_extruir2_profile_7_tool
    add(cortar_extruir2_profile_7_tool.part, mode=Mode.SUBTRACT)


with BuildPart() as cortar_extruir2_profile_8_tool:
    # Croquis5 → Cortar-Extruir2 profile 8 (with draft: the straight prism first)
    with BuildSketch(Plane.ZY):
        with Locations((69.751939629, 57.929874619)):
            Circle(CROQUIS5_R)
    extrude(amount=-CORTAR_EXTRUIR2_PROFILE_8_DEPTH)
    # Cortar-Extruir2 profile 8: the draft: its side faces are tilted about the plane it starts from
    cortar_extruir2_profile_8_sides = [cortar_extruir2_profile_8_tool.faces().sort_by_distance(p)[0] for p in [
        (1.27, 57.929874619, 65.941939629),
    ]]
    draft(cortar_extruir2_profile_8_sides, Plane.ZY, CORTAR_EXTRUIR2_PROFILE_8_DRAFT)


with BuildPart() as part_14:
    add(part_13.part)

    # Cortar-Extruir2 profile 8: cut by cortar_extruir2_profile_8_tool
    add(cortar_extruir2_profile_8_tool.part, mode=Mode.SUBTRACT)


with BuildPart() as cortar_extruir2_profile_9_tool:
    # Croquis5 → Cortar-Extruir2 profile 9 (with draft: the straight prism first)
    with BuildSketch(Plane.ZY):
        with Locations((48.265473167, -152.285748198)):
            Circle(CROQUIS5_R)
    extrude(amount=-CORTAR_EXTRUIR2_PROFILE_9_DEPTH)
    # Cortar-Extruir2 profile 9: the draft: its side faces are tilted about the plane it starts from
    cortar_extruir2_profile_9_sides = [cortar_extruir2_profile_9_tool.faces().sort_by_distance(p)[0] for p in [
        (1.27, -152.285748198, 44.455473167),
    ]]
    draft(cortar_extruir2_profile_9_sides, Plane.ZY, CORTAR_EXTRUIR2_PROFILE_9_DRAFT)


with BuildPart() as part_15:
    add(part_14.part)

    # Cortar-Extruir2 profile 9: cut by cortar_extruir2_profile_9_tool
    add(cortar_extruir2_profile_9_tool.part, mode=Mode.SUBTRACT)


solid = part_15.part
